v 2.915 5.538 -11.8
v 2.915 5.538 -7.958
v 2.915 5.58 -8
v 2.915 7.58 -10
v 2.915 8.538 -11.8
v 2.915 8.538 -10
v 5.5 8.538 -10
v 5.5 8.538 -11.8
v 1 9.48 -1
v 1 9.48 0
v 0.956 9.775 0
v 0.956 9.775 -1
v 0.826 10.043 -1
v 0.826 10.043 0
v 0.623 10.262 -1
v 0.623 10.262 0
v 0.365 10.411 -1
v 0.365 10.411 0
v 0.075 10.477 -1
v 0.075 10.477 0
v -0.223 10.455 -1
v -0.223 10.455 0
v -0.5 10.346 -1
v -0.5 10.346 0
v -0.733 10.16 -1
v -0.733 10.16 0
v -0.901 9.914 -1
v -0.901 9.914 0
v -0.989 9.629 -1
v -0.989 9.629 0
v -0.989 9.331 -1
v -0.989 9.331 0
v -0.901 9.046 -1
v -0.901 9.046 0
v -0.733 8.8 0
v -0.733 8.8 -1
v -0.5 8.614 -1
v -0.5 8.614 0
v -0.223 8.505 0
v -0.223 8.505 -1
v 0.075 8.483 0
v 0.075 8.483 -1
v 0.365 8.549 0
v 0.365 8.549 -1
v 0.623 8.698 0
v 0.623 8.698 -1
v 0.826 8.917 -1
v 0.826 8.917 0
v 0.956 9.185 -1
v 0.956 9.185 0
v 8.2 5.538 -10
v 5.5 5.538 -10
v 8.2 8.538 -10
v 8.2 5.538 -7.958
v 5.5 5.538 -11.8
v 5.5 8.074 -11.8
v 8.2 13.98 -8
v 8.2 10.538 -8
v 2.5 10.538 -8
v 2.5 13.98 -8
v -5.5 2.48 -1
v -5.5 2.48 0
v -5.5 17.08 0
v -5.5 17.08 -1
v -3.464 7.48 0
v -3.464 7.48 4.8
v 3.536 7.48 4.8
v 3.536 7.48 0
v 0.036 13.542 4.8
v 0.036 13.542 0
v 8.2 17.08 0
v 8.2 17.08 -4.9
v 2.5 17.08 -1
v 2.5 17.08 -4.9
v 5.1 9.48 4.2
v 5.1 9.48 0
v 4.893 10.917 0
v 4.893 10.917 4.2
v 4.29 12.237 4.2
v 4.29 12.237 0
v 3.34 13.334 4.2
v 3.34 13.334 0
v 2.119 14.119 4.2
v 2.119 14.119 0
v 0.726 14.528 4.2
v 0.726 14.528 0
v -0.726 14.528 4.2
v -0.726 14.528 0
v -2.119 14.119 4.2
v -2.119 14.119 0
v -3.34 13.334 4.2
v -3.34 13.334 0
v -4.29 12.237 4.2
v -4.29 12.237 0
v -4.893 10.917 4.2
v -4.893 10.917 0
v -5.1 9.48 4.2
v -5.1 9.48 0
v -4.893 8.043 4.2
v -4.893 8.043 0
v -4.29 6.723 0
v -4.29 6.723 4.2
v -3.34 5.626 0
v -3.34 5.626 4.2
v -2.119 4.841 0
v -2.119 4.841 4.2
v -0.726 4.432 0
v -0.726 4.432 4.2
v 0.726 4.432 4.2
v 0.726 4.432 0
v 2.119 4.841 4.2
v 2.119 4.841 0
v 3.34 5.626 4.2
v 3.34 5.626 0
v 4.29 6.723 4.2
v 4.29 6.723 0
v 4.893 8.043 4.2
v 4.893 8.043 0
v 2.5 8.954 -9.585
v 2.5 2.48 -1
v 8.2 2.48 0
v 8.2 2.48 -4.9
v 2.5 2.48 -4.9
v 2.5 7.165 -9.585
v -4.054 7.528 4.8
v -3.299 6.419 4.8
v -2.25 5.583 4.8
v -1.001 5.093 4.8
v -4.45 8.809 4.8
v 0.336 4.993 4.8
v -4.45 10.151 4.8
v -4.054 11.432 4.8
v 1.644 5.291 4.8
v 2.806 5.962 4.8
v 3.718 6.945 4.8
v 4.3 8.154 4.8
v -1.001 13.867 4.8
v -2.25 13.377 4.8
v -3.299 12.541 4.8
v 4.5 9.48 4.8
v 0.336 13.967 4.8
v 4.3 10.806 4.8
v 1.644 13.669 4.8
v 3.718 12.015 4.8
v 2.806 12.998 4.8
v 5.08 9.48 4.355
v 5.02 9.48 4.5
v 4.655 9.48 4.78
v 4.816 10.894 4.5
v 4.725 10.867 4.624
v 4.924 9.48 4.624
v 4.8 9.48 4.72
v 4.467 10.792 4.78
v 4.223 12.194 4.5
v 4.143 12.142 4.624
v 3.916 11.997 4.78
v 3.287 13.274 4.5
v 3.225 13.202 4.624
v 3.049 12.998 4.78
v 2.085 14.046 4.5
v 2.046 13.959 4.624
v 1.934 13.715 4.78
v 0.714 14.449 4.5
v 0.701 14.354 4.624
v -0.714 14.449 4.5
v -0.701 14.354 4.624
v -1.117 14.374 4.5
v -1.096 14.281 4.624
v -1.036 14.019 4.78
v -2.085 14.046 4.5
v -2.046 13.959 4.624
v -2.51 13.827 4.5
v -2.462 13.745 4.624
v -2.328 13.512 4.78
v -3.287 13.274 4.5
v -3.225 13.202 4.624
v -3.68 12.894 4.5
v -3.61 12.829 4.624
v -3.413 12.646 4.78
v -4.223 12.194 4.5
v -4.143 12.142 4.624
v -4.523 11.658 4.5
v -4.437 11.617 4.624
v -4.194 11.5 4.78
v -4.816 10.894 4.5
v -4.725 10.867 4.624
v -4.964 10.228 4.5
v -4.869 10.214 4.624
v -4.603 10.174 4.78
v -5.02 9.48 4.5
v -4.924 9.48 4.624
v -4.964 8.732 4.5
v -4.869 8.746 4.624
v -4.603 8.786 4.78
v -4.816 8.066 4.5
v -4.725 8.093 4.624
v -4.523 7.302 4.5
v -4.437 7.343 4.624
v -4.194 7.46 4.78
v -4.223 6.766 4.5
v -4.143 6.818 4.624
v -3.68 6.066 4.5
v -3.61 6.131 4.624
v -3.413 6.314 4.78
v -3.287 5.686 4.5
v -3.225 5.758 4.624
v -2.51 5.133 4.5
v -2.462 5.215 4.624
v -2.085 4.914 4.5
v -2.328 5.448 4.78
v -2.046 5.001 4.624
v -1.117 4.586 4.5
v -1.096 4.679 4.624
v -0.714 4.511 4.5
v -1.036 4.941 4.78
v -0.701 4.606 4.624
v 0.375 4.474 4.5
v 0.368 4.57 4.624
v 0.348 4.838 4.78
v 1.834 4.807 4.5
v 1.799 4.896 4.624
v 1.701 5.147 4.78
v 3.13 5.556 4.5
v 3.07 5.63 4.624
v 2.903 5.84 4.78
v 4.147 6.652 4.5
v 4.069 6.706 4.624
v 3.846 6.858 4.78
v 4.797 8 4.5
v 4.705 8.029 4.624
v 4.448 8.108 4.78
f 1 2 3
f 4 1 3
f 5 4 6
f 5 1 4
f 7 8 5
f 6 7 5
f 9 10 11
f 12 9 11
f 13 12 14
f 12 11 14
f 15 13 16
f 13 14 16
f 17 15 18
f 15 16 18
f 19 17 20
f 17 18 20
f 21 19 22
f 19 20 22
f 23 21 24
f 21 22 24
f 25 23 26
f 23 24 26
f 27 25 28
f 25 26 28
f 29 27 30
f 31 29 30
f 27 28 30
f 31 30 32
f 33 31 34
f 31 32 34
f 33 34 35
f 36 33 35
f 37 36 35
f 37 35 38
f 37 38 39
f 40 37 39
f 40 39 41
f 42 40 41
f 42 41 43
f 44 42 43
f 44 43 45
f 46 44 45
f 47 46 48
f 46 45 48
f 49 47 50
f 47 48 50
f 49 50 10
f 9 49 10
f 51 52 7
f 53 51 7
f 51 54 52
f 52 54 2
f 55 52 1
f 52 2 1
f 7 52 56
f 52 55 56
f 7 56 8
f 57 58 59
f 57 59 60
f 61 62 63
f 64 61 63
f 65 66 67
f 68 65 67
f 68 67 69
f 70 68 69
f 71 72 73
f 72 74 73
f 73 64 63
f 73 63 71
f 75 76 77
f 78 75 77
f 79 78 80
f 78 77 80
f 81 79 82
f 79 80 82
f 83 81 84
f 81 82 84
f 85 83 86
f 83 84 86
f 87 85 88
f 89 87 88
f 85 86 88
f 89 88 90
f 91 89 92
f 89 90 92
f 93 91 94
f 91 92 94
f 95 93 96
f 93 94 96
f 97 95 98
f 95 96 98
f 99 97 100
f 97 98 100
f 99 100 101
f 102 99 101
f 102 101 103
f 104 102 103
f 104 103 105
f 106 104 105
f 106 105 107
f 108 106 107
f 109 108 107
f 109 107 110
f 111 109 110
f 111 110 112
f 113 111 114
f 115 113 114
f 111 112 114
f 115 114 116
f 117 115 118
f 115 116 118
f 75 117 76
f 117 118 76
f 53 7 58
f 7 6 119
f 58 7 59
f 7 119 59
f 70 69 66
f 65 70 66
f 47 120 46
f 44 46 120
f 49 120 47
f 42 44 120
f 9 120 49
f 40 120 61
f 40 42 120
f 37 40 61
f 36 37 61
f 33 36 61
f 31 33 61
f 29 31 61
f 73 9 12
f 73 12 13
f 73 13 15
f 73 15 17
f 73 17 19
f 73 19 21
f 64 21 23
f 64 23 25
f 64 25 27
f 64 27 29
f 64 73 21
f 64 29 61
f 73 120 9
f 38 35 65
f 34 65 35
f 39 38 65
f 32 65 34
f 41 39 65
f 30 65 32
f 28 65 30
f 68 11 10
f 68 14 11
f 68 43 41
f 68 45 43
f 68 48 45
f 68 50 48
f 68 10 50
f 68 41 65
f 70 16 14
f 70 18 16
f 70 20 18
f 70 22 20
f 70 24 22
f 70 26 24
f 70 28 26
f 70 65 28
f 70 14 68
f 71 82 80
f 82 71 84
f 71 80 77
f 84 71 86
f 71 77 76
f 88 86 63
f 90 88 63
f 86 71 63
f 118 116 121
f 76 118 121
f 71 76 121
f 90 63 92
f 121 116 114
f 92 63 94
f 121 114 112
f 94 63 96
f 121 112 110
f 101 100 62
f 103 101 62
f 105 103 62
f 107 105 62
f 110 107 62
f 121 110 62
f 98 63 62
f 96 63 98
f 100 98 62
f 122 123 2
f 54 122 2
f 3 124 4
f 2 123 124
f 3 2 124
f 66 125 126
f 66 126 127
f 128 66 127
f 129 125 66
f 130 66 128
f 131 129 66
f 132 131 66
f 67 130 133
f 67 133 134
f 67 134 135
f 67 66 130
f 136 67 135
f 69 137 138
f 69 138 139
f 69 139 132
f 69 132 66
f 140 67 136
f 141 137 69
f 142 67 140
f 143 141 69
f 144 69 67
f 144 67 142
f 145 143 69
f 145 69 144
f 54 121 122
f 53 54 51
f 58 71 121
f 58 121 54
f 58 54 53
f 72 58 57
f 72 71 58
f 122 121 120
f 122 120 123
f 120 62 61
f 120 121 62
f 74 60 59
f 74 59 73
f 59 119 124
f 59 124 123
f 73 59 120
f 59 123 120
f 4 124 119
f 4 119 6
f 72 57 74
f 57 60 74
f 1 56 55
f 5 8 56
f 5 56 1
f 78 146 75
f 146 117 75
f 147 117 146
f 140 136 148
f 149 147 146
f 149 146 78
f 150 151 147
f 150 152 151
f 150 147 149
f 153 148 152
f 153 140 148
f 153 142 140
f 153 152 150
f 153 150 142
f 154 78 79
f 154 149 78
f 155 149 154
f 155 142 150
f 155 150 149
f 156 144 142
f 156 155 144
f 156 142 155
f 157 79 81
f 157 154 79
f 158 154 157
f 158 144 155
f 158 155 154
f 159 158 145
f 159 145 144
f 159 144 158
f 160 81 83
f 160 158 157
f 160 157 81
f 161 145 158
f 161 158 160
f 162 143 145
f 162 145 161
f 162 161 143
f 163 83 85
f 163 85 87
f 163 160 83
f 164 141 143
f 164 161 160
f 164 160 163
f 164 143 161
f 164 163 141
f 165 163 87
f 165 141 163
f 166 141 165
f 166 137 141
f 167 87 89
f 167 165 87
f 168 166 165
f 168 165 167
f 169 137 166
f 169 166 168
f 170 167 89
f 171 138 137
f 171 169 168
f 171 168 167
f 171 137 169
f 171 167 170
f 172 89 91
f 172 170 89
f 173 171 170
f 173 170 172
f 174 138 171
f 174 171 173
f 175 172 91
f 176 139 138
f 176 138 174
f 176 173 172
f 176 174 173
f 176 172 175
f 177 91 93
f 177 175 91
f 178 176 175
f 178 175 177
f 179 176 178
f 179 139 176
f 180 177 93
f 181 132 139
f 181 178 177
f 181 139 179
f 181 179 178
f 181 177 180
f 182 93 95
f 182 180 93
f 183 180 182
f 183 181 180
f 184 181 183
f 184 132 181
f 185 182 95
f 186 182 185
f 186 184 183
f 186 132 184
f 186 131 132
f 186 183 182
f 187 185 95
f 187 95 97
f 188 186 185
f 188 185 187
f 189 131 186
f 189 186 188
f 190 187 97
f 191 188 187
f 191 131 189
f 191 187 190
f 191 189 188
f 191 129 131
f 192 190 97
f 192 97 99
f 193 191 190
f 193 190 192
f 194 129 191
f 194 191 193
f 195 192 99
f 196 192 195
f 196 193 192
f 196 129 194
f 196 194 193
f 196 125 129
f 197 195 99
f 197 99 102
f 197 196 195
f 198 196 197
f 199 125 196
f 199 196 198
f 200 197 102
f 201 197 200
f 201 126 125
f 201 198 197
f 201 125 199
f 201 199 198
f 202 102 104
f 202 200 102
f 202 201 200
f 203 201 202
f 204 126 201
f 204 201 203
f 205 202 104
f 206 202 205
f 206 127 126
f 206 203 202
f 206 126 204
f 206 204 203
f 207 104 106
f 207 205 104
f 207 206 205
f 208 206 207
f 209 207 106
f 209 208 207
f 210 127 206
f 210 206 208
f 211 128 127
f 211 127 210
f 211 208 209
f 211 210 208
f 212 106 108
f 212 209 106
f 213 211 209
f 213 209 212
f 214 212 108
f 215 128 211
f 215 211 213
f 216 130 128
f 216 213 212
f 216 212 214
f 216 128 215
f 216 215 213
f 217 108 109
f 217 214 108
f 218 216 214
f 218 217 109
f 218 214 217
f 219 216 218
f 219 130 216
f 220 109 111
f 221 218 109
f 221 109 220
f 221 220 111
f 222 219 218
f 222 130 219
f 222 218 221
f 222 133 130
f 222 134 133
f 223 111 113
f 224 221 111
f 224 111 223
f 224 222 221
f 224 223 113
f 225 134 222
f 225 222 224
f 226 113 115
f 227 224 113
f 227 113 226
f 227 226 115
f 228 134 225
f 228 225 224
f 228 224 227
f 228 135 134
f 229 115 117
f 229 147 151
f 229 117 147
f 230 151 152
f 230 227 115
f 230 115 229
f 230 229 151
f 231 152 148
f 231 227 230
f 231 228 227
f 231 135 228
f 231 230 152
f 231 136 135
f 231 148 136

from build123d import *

# Parameters (mm, degrees)
SKETCH_2_R          = 5.1
EXTRUDE_1_DEPTH     = 4.8
SKETCH_3_W          = 11
SKETCH_3_H          = 14.6
EXTRUDE_2_DEPTH     = 1
SKETCH_4_R          = 1.5
EXTRUDE_3_DEPTH     = 10.8
CUT_EXTRUDE_1_DEPTH = 10.8
FILLET_1_R          = 0.6
CUT_EXTRUDE_2_DEPTH = 4.8
SKETCH_7_R          = 1
CUT_EXTRUDE_3_DEPTH = 1
SKETCH_8_W          = 3
SKETCH_8_H          = 14.6
EXTRUDE_4_DEPTH     = 7
CHAMFER_1_SIZE      = 3.1
SKETCH_9_W          = 2.584868303
SKETCH_9_H          = 3
EXTRUDE_5_DEPTH     = 10
CHAMFER_3_SIZE      = 2
CHAMFER_4_SIZE      = 2
EXTRUDE_6_DEPTH     = 2.7


with BuildPart() as part:
    # Эскиз2 → Бобышка-Вытянуть1 (new body)
    with BuildSketch(Plane.XY):
        with Locations((0, 9.48)):
            Circle(SKETCH_2_R)
    extrude(amount=EXTRUDE_1_DEPTH)

    # Эскиз3 → Бобышка-Вытянуть2 (add)
    with BuildSketch(Plane(origin=(0, 0, 0), x_dir=(-1, 0, 0), z_dir=(0, 0, -1))):
        with Locations((0, 9.78)):
            Rectangle(SKETCH_3_W, SKETCH_3_H)
    extrude(amount=EXTRUDE_2_DEPTH)

    # Эскиз4 → Бобышка-Вытянуть3 (add)
    with BuildSketch(Plane(origin=(0, 0, -1), x_dir=(-1, 0, 0), z_dir=(0, 0, -1))):
        with Locations(Location((-4.415131697, 7.038465404, 0), (0, 0, 223.676907922))):
            Circle(SKETCH_4_R)
    extrude(amount=EXTRUDE_3_DEPTH)

    # Эскиз5 → Вырез-Вытянуть1 (cut)
    with BuildSketch(Plane.XY.offset(-1)):
        with BuildLine():
            Line((5.5, 8.074351868), (5.5, 6.002578941))
            ThreePointArc((5.5, 6.002578941), (5.915131697, 7.038465404), (5.5, 8.074351868))
        make_face()
    extrude(amount=-CUT_EXTRUDE_1_DEPTH, mode=Mode.SUBTRACT)

    # Скругление1
    fillet_1_edges = [part.edges().sort_by_distance(p)[0] for p in [
        (-5.1, 9.48, 4.8),
    ]]
    fillet(fillet_1_edges, radius=FILLET_1_R)

    # Эскиз6 → Вырез-Вытянуть2 (cut)
    with BuildSketch(Plane.XY.offset(4.8)):
        Polygon((0.035898385, 13.542177826), (-3.464101615, 7.48), (3.535898385, 7.48), align=None)
    extrude(amount=-CUT_EXTRUDE_2_DEPTH, mode=Mode.SUBTRACT)

    # Эскиз7 → Вырез-Вытянуть3 (cut)
    with BuildSketch(Plane.XY):
        with Locations((0, 9.48)):
            Circle(SKETCH_7_R)
    extrude(amount=-CUT_EXTRUDE_3_DEPTH, mode=Mode.SUBTRACT)

    # Эскиз8 → Бобышка-Вытянуть4 (add)
    with BuildSketch(Plane(origin=(0, 0, -1), x_dir=(-1, 0, 0), z_dir=(0, 0, -1))):
        with Locations((-4, 9.78)):
            Rectangle(SKETCH_8_W, SKETCH_8_H)
    extrude(amount=EXTRUDE_4_DEPTH)

    # Фаска1
    # the kernel refuses this chamfer: 3.1 mm, written as the material it takes off along each edge
    with BuildSketch(Plane(origin=(-5.472217263, 2.48, -8), x_dir=(0, -0.027495876610586382, 0.9996219169112966), z_dir=(1, 0, 0))) as chamfer_1_piece_1_section:
        Polygon((CHAMFER_1_SIZE * 0.999621916911, -CHAMFER_1_SIZE * 0.0274958766106), (-CHAMFER_1_SIZE * 0.0274958766106, -CHAMFER_1_SIZE * 0.999621916911), (0, 0), align=None)
    chamfer_1_piece_1 = extrude(amount=18.944434525, mode=Mode.PRIVATE)
    chamfer_1_piece_1 = chamfer_1_piece_1 - Plane(origin=(4.415131697, 7.038465404, -6.977511347), x_dir=(0.7232455354515278, -0.6905909755053515, 0), z_dir=(0, 0, 1)) * Cylinder(1.5, 51, mode=Mode.PRIVATE)
    add(chamfer_1_piece_1, mode=Mode.SUBTRACT)
    with BuildSketch(Plane(origin=(13.472217263, 17.08, -8), x_dir=(0, -0.9996219169112966, -0.027495876610586514), z_dir=(-1, 0, 0))) as chamfer_1_piece_2:
        Polygon((CHAMFER_1_SIZE * 0.999621916911, CHAMFER_1_SIZE * 0.0274958766106), (-CHAMFER_1_SIZE * 0.0274958766106, CHAMFER_1_SIZE * 0.999621916911), (0, 0), align=None)
    extrude(amount=18.944434525, mode=Mode.SUBTRACT)

    # Эскиз9 → Бобышка-Вытянуть5 (add)
    with BuildSketch(Plane(origin=(0, 0, -11.8), x_dir=(-1, 0, 0), z_dir=(0, 0, -1))):
        with Locations((-4.207565848, 7.038465404)):
            Rectangle(SKETCH_9_W, SKETCH_9_H)
    extrude(amount=-EXTRUDE_5_DEPTH)

    # Фаска3
    chamfer_3_edges = [part.edges().sort_by_distance(p)[0] for p in [
        (4.207565848, 8.538465404, -8),
    ]]
    chamfer(chamfer_3_edges, length=CHAMFER_3_SIZE)

    # Фаска4
    # the kernel refuses this chamfer: 2 mm, written as the material it adds along each edge
    with BuildSketch(Plane(origin=(2.915131697, 15.68183138, -8), x_dir=(-0.9996219169112968, 6.965053790802993e-15, 0.027495876610586487), z_dir=(0, -1, 0))) as chamfer_4_piece_1_section:
        Polygon((CHAMFER_4_SIZE * 0.999621916911, CHAMFER_4_SIZE * 0.0274958766106), (-CHAMFER_4_SIZE * 0.0274958766106, CHAMFER_4_SIZE * 0.999621916911), (0, 0), align=None)
    chamfer_4_piece_1 = extrude(amount=15.245197356, mode=Mode.PRIVATE)
    chamfer_4_piece_1 = split(chamfer_4_piece_1, bisect_by=Plane(origin=(2.5, 9.220354444, -8.636221921), z_dir=(1, 0, 0)), keep=Keep.TOP, mode=Mode.PRIVATE)
    chamfer_4_piece_1 = split(chamfer_4_piece_1, bisect_by=Plane(origin=(2.728922141, 9.561298963, -8.977166441), z_dir=(0, -0.7071067811865476, 0.7071067811865476)), keep=Keep.TOP, mode=Mode.PRIVATE)
    chamfer_4_piece_1 = split(chamfer_4_piece_1, bisect_by=Plane(origin=(2.728922141, 8.538465404, -8.636221921), z_dir=(0, 1, 0)), keep=Keep.TOP, mode=Mode.PRIVATE)
    add(chamfer_4_piece_1)
    with BuildSketch(Plane(origin=(2.915131697, 15.68183138, -8), x_dir=(-0.9996219169112968, 6.965053790802993e-15, 0.027495876610586487), z_dir=(0, -1, 0))) as chamfer_4_piece_2_section:
        Polygon((CHAMFER_4_SIZE * 0.999621916911, CHAMFER_4_SIZE * 0.0274958766106), (-CHAMFER_4_SIZE * 0.0274958766106, CHAMFER_4_SIZE * 0.999621916911), (0, 0), align=None)
    chamfer_4_piece_2 = extrude(amount=15.245197356, mode=Mode.PRIVATE)
    chamfer_4_piece_2 = split(chamfer_4_piece_2, bisect_by=Plane(origin=(2.5, 7.443880943, -8.769342974), z_dir=(1, 0, 0)), keep=Keep.TOP, mode=Mode.PRIVATE)
    chamfer_4_piece_2 = split(chamfer_4_piece_2, bisect_by=Plane(origin=(2.735166787, 6.896611958, -9.316611958), z_dir=(0, 0.7071067811862648, 0.7071067811868302)), keep=Keep.TOP, mode=Mode.PRIVATE)
    chamfer_4_piece_2 = split(chamfer_4_piece_2, bisect_by=Plane(origin=(2.735166787, 8.606501686, -9.931963718), z_dir=(0, -0.7071067811865476, 0.7071067811865476)), keep=Keep.TOP, mode=Mode.PRIVATE)
    chamfer_4_piece_2 = split(chamfer_4_piece_2, bisect_by=Plane(origin=(2.735166787, 8.538465404, -8.769342974), z_dir=(0, -1, 0)), keep=Keep.TOP, mode=Mode.PRIVATE)
    add(chamfer_4_piece_2)

    # Эскиз10 → Бобышка-Вытянуть6 (add)
    with BuildSketch(Plane(origin=(5.5, 0, 0), x_dir=(0, 0, -1), z_dir=(1, 0, 0))):
        Polygon((10, 5.538465404), (10, 8.538465404), (8, 10.538465404), (8, 13.98), (4.9, 17.08), (0, 17.08), (0, 2.48), (4.9, 2.48), (7.958465404, 5.538465404), align=None)
    extrude(amount=EXTRUDE_6_DEPTH)


solid = part.part
